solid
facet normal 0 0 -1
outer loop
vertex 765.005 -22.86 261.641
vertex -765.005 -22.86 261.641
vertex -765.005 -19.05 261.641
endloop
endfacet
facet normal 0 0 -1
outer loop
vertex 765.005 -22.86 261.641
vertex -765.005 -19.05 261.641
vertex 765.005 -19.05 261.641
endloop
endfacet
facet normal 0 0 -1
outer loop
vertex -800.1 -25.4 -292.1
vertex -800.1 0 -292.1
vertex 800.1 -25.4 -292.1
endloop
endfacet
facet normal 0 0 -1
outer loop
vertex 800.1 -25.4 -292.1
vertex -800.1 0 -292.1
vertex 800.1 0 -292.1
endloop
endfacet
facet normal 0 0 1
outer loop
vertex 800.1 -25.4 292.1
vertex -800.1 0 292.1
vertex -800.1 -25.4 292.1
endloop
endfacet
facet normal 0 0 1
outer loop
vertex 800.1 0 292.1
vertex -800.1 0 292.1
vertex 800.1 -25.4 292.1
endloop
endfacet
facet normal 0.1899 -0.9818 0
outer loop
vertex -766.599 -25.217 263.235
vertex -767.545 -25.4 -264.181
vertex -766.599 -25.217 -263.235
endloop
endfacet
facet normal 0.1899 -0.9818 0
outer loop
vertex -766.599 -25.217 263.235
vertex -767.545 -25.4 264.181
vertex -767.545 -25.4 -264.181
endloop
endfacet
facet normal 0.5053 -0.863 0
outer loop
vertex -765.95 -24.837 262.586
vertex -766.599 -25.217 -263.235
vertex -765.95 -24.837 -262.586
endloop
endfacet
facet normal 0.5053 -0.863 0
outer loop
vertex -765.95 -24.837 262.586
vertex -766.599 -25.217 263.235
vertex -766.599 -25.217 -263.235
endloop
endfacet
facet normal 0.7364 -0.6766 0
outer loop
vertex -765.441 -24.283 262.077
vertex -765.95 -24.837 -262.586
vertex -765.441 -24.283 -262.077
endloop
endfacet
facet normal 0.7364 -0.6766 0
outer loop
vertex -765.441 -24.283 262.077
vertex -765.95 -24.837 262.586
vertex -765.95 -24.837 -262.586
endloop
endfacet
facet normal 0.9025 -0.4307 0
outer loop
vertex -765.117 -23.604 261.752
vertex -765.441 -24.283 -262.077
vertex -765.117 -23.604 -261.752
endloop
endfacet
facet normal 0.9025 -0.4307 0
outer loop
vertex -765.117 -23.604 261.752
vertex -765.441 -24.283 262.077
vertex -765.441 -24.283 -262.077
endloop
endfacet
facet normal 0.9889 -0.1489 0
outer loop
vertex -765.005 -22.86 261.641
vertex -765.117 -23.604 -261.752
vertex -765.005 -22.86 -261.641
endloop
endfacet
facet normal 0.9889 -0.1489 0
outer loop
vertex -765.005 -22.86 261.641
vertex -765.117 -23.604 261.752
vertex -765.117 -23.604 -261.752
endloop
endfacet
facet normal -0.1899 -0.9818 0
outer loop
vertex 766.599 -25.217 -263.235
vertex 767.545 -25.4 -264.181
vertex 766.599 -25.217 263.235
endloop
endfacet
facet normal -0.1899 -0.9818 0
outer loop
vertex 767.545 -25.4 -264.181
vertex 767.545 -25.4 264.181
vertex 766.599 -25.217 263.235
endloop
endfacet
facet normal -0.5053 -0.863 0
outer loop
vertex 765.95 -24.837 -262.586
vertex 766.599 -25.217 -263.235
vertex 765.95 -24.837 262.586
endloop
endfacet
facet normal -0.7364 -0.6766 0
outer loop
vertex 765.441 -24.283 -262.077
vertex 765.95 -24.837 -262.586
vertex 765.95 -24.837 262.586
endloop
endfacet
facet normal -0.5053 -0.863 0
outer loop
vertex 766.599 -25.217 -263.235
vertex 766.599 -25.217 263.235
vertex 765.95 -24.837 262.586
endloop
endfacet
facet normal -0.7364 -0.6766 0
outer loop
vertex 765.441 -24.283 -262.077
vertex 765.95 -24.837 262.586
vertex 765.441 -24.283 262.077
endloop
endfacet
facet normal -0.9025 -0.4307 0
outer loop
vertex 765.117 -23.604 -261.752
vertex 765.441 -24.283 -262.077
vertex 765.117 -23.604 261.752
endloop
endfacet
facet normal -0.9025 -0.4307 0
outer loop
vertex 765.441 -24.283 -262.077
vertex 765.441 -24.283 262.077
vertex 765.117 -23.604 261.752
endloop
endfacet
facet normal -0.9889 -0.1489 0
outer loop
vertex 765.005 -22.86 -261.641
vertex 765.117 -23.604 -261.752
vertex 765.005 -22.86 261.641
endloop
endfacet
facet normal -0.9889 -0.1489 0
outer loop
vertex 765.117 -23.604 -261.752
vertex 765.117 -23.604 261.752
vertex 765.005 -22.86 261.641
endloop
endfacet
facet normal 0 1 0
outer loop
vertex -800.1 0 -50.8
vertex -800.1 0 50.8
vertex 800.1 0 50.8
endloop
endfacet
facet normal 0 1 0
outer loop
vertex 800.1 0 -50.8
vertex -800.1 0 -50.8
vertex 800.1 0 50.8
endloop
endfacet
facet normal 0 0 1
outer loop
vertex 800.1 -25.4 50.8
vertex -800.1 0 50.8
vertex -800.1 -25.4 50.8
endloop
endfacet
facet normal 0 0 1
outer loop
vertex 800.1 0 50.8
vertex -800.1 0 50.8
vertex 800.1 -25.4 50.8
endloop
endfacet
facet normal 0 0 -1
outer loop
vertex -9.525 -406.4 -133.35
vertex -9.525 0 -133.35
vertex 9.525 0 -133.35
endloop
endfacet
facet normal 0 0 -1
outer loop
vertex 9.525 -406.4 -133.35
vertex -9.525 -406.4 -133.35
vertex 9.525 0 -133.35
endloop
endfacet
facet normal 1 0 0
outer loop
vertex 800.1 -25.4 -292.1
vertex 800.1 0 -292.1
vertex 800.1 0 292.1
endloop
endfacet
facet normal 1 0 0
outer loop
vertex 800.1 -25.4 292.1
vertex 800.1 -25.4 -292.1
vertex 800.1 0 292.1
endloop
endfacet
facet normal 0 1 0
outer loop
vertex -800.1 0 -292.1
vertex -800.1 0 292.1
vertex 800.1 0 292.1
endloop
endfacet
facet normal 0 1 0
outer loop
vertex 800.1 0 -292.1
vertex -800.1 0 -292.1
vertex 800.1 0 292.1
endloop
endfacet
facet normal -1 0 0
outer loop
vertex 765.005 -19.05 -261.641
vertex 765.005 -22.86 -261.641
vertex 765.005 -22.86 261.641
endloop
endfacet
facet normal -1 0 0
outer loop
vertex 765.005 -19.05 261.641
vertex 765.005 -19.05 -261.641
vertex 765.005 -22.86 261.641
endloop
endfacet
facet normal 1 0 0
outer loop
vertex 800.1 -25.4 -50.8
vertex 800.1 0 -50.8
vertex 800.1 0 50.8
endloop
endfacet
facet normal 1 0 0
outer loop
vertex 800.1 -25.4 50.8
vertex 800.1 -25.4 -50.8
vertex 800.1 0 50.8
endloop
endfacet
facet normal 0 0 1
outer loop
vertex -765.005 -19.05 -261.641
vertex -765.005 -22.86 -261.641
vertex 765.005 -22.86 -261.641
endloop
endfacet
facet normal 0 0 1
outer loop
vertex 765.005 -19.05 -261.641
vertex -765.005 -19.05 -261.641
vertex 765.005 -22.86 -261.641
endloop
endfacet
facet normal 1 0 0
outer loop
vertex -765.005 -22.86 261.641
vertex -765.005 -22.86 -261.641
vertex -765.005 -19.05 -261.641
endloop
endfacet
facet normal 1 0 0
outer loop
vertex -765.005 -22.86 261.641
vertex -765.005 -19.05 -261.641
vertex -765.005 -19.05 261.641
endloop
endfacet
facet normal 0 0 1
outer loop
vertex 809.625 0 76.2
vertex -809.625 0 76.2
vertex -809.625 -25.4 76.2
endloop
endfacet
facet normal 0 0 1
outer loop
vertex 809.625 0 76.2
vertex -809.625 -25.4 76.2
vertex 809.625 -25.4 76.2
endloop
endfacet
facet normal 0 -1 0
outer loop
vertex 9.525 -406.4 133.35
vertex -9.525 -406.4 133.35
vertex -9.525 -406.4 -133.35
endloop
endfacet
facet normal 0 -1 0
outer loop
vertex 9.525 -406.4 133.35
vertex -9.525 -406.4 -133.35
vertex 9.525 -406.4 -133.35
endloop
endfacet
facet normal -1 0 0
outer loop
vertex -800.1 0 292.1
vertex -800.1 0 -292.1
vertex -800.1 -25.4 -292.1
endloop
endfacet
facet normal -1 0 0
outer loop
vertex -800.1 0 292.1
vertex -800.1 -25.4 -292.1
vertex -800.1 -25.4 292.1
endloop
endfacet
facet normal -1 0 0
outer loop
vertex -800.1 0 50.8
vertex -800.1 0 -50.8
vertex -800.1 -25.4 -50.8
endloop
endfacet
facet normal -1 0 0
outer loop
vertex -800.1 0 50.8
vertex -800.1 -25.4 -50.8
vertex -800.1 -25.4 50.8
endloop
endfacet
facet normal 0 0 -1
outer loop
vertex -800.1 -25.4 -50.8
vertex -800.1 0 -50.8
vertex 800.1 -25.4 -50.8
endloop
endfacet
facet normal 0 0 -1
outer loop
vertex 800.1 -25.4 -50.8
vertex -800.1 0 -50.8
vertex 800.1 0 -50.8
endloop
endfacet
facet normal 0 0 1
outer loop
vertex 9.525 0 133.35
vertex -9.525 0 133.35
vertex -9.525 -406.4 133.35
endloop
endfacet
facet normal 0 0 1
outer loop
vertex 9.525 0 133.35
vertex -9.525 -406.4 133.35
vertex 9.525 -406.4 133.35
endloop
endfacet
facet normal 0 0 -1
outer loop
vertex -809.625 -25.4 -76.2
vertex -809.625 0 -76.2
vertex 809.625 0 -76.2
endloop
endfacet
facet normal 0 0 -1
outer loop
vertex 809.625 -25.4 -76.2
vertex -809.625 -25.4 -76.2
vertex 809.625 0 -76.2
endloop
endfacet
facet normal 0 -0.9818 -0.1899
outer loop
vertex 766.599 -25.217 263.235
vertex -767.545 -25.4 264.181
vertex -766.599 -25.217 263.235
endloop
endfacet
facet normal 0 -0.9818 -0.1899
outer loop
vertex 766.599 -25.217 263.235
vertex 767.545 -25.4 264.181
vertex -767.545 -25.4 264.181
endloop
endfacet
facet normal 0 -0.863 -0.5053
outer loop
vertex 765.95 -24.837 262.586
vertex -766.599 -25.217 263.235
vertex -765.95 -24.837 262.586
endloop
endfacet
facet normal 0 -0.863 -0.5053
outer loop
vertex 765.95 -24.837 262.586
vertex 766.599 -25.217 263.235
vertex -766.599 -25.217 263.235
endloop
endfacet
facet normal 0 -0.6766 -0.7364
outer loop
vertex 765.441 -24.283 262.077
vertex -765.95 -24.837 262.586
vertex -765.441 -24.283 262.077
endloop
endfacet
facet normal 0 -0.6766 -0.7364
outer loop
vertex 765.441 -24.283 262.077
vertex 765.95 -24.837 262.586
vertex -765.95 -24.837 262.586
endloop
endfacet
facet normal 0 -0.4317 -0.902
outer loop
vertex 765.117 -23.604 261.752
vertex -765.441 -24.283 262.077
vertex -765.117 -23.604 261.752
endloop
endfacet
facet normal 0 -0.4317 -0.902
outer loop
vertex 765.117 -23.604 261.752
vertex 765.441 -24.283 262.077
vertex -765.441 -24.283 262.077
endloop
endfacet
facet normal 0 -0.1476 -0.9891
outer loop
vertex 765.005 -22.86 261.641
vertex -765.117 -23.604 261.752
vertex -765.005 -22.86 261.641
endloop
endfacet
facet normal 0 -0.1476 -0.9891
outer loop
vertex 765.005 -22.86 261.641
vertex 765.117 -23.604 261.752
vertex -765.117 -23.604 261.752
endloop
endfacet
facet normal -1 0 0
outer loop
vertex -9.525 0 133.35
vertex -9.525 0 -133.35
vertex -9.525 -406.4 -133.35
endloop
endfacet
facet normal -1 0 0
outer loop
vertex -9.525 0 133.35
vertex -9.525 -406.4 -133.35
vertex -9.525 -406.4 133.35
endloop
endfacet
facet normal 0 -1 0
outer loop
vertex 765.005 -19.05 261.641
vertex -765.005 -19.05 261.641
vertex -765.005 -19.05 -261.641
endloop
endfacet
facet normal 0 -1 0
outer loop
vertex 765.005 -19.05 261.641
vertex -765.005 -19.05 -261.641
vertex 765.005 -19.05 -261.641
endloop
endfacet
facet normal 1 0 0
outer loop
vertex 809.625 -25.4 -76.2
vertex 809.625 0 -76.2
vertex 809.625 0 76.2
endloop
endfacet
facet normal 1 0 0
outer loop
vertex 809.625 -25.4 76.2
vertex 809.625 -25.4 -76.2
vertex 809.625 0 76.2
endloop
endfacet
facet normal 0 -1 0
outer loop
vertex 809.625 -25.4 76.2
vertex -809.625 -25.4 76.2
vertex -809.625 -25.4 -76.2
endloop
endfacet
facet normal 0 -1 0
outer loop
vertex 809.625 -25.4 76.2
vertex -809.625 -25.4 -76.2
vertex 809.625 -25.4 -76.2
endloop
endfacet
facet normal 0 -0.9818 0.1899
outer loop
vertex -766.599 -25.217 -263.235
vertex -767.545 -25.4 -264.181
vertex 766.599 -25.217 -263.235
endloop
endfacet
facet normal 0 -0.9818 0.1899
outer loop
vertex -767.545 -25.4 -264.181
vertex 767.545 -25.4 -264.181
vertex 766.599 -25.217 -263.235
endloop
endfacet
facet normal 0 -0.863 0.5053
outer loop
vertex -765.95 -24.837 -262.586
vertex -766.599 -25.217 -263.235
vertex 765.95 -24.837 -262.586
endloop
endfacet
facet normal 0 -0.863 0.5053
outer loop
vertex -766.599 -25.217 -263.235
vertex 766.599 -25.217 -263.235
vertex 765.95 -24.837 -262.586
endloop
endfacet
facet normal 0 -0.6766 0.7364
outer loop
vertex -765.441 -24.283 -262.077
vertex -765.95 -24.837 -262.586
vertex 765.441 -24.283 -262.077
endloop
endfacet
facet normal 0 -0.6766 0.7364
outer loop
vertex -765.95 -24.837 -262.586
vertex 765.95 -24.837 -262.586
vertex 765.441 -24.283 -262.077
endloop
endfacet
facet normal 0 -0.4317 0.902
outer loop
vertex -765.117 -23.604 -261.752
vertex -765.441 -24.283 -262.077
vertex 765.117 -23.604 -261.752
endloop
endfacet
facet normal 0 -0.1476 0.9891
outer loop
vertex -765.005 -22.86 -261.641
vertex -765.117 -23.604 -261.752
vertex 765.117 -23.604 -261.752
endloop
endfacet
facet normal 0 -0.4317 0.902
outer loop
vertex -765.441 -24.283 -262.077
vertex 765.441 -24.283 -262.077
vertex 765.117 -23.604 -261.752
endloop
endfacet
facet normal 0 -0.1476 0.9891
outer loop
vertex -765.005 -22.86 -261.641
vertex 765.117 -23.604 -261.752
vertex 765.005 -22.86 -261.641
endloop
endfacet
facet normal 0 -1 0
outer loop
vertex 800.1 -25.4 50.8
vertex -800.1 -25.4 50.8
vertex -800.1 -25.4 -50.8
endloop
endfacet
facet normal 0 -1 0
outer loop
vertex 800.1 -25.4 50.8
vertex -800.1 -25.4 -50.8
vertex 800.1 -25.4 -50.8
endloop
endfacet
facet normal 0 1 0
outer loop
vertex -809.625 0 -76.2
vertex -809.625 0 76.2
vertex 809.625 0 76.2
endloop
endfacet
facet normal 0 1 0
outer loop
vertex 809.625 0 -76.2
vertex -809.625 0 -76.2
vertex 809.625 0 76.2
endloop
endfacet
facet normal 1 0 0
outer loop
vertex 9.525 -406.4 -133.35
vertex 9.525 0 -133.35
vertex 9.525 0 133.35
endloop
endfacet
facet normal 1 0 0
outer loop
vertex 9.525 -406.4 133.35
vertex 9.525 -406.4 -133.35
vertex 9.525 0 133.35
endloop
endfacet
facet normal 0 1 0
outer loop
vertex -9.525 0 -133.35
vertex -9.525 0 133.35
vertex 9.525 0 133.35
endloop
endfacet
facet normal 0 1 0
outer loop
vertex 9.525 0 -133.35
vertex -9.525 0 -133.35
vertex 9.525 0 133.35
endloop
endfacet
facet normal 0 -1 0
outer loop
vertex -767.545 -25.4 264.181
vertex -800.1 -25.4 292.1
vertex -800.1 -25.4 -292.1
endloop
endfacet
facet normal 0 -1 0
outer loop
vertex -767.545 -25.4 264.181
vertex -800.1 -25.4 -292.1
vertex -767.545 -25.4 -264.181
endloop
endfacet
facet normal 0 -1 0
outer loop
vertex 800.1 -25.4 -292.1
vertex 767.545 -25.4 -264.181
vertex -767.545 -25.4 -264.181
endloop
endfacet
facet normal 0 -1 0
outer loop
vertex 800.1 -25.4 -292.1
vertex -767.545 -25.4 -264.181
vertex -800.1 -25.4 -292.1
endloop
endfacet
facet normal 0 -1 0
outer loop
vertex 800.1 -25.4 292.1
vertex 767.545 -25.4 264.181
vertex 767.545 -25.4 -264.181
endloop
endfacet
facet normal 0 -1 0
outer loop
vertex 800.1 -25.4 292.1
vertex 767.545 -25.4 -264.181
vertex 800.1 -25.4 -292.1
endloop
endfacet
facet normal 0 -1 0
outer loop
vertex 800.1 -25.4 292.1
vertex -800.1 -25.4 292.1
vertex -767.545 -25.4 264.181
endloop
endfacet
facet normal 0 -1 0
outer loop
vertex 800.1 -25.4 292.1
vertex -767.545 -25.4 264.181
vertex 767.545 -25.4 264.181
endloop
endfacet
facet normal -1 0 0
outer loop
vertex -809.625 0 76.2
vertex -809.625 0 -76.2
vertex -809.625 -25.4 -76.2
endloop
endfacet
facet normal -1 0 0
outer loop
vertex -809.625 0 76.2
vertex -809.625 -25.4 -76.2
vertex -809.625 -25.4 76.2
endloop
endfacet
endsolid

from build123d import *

# Parameters (mm, degrees)
F0_W      = 19.05
F0_H      = 266.7
F1_DEPTH  = 406.4
F2_W      = 1600.2
F2_H      = 101.6
F4_DEPTH  = 25.4
F5_W      = 1600.2
F5_H      = 584.2
F6_DEPTH  = 25.4
F7_W      = 1619.25
F7_H      = 152.4
F8_DEPTH  = 25.4
F9_W      = 1530.010342598
F9_H      = 523.2815742493
F10_DEPTH = 6.35
F12_R     = 2.54


with BuildPart() as f1:
    # F0 (on Front) → F1 (new body)
    with BuildSketch(Plane.XZ):
        Rectangle(F0_W, F0_H)
    extrude(amount=F1_DEPTH)


with BuildPart() as f4:
    # F2 (on Front) → F4 (new body)
    with BuildSketch(Plane.XZ):
        Rectangle(F2_W, F2_H)
    extrude(amount=F4_DEPTH)


with BuildPart() as f6:
    # F5 (on Front) → F6 (new body)
    with BuildSketch(Plane.XZ):
        Rectangle(F5_W, F5_H)
    extrude(amount=F6_DEPTH)


with BuildPart() as f8:
    # F7 (on Front) → F8 (new body)
    with BuildSketch(Plane.XZ):
        Rectangle(F7_W, F7_H)
    extrude(amount=F8_DEPTH)


with BuildPart() as f10:
    # F9 (on face) → F10 (new body, symmetric)
    with BuildSketch(Plane.XZ.offset(25.4)):
        Rectangle(F9_W, F9_H)
    extrude(amount=F10_DEPTH, both=True)


with BuildPart() as f6_1:
    add(f6.part)

    # F11: cut F10
    add(f10.part, mode=Mode.SUBTRACT)

    # F12
    f12_edges = [f6_1.edges().sort_by_distance(p)[0] for p in [
        (0, -25.4, 261.640787),
        (-765.005171, -25.4, 0),
        (0, -25.4, -261.640787),
        (765.005171, -25.4, 0),
    ]]
    fillet(f12_edges, radius=F12_R)


solid = Compound([f1.part, f4.part, f8.part, f6_1.part])
